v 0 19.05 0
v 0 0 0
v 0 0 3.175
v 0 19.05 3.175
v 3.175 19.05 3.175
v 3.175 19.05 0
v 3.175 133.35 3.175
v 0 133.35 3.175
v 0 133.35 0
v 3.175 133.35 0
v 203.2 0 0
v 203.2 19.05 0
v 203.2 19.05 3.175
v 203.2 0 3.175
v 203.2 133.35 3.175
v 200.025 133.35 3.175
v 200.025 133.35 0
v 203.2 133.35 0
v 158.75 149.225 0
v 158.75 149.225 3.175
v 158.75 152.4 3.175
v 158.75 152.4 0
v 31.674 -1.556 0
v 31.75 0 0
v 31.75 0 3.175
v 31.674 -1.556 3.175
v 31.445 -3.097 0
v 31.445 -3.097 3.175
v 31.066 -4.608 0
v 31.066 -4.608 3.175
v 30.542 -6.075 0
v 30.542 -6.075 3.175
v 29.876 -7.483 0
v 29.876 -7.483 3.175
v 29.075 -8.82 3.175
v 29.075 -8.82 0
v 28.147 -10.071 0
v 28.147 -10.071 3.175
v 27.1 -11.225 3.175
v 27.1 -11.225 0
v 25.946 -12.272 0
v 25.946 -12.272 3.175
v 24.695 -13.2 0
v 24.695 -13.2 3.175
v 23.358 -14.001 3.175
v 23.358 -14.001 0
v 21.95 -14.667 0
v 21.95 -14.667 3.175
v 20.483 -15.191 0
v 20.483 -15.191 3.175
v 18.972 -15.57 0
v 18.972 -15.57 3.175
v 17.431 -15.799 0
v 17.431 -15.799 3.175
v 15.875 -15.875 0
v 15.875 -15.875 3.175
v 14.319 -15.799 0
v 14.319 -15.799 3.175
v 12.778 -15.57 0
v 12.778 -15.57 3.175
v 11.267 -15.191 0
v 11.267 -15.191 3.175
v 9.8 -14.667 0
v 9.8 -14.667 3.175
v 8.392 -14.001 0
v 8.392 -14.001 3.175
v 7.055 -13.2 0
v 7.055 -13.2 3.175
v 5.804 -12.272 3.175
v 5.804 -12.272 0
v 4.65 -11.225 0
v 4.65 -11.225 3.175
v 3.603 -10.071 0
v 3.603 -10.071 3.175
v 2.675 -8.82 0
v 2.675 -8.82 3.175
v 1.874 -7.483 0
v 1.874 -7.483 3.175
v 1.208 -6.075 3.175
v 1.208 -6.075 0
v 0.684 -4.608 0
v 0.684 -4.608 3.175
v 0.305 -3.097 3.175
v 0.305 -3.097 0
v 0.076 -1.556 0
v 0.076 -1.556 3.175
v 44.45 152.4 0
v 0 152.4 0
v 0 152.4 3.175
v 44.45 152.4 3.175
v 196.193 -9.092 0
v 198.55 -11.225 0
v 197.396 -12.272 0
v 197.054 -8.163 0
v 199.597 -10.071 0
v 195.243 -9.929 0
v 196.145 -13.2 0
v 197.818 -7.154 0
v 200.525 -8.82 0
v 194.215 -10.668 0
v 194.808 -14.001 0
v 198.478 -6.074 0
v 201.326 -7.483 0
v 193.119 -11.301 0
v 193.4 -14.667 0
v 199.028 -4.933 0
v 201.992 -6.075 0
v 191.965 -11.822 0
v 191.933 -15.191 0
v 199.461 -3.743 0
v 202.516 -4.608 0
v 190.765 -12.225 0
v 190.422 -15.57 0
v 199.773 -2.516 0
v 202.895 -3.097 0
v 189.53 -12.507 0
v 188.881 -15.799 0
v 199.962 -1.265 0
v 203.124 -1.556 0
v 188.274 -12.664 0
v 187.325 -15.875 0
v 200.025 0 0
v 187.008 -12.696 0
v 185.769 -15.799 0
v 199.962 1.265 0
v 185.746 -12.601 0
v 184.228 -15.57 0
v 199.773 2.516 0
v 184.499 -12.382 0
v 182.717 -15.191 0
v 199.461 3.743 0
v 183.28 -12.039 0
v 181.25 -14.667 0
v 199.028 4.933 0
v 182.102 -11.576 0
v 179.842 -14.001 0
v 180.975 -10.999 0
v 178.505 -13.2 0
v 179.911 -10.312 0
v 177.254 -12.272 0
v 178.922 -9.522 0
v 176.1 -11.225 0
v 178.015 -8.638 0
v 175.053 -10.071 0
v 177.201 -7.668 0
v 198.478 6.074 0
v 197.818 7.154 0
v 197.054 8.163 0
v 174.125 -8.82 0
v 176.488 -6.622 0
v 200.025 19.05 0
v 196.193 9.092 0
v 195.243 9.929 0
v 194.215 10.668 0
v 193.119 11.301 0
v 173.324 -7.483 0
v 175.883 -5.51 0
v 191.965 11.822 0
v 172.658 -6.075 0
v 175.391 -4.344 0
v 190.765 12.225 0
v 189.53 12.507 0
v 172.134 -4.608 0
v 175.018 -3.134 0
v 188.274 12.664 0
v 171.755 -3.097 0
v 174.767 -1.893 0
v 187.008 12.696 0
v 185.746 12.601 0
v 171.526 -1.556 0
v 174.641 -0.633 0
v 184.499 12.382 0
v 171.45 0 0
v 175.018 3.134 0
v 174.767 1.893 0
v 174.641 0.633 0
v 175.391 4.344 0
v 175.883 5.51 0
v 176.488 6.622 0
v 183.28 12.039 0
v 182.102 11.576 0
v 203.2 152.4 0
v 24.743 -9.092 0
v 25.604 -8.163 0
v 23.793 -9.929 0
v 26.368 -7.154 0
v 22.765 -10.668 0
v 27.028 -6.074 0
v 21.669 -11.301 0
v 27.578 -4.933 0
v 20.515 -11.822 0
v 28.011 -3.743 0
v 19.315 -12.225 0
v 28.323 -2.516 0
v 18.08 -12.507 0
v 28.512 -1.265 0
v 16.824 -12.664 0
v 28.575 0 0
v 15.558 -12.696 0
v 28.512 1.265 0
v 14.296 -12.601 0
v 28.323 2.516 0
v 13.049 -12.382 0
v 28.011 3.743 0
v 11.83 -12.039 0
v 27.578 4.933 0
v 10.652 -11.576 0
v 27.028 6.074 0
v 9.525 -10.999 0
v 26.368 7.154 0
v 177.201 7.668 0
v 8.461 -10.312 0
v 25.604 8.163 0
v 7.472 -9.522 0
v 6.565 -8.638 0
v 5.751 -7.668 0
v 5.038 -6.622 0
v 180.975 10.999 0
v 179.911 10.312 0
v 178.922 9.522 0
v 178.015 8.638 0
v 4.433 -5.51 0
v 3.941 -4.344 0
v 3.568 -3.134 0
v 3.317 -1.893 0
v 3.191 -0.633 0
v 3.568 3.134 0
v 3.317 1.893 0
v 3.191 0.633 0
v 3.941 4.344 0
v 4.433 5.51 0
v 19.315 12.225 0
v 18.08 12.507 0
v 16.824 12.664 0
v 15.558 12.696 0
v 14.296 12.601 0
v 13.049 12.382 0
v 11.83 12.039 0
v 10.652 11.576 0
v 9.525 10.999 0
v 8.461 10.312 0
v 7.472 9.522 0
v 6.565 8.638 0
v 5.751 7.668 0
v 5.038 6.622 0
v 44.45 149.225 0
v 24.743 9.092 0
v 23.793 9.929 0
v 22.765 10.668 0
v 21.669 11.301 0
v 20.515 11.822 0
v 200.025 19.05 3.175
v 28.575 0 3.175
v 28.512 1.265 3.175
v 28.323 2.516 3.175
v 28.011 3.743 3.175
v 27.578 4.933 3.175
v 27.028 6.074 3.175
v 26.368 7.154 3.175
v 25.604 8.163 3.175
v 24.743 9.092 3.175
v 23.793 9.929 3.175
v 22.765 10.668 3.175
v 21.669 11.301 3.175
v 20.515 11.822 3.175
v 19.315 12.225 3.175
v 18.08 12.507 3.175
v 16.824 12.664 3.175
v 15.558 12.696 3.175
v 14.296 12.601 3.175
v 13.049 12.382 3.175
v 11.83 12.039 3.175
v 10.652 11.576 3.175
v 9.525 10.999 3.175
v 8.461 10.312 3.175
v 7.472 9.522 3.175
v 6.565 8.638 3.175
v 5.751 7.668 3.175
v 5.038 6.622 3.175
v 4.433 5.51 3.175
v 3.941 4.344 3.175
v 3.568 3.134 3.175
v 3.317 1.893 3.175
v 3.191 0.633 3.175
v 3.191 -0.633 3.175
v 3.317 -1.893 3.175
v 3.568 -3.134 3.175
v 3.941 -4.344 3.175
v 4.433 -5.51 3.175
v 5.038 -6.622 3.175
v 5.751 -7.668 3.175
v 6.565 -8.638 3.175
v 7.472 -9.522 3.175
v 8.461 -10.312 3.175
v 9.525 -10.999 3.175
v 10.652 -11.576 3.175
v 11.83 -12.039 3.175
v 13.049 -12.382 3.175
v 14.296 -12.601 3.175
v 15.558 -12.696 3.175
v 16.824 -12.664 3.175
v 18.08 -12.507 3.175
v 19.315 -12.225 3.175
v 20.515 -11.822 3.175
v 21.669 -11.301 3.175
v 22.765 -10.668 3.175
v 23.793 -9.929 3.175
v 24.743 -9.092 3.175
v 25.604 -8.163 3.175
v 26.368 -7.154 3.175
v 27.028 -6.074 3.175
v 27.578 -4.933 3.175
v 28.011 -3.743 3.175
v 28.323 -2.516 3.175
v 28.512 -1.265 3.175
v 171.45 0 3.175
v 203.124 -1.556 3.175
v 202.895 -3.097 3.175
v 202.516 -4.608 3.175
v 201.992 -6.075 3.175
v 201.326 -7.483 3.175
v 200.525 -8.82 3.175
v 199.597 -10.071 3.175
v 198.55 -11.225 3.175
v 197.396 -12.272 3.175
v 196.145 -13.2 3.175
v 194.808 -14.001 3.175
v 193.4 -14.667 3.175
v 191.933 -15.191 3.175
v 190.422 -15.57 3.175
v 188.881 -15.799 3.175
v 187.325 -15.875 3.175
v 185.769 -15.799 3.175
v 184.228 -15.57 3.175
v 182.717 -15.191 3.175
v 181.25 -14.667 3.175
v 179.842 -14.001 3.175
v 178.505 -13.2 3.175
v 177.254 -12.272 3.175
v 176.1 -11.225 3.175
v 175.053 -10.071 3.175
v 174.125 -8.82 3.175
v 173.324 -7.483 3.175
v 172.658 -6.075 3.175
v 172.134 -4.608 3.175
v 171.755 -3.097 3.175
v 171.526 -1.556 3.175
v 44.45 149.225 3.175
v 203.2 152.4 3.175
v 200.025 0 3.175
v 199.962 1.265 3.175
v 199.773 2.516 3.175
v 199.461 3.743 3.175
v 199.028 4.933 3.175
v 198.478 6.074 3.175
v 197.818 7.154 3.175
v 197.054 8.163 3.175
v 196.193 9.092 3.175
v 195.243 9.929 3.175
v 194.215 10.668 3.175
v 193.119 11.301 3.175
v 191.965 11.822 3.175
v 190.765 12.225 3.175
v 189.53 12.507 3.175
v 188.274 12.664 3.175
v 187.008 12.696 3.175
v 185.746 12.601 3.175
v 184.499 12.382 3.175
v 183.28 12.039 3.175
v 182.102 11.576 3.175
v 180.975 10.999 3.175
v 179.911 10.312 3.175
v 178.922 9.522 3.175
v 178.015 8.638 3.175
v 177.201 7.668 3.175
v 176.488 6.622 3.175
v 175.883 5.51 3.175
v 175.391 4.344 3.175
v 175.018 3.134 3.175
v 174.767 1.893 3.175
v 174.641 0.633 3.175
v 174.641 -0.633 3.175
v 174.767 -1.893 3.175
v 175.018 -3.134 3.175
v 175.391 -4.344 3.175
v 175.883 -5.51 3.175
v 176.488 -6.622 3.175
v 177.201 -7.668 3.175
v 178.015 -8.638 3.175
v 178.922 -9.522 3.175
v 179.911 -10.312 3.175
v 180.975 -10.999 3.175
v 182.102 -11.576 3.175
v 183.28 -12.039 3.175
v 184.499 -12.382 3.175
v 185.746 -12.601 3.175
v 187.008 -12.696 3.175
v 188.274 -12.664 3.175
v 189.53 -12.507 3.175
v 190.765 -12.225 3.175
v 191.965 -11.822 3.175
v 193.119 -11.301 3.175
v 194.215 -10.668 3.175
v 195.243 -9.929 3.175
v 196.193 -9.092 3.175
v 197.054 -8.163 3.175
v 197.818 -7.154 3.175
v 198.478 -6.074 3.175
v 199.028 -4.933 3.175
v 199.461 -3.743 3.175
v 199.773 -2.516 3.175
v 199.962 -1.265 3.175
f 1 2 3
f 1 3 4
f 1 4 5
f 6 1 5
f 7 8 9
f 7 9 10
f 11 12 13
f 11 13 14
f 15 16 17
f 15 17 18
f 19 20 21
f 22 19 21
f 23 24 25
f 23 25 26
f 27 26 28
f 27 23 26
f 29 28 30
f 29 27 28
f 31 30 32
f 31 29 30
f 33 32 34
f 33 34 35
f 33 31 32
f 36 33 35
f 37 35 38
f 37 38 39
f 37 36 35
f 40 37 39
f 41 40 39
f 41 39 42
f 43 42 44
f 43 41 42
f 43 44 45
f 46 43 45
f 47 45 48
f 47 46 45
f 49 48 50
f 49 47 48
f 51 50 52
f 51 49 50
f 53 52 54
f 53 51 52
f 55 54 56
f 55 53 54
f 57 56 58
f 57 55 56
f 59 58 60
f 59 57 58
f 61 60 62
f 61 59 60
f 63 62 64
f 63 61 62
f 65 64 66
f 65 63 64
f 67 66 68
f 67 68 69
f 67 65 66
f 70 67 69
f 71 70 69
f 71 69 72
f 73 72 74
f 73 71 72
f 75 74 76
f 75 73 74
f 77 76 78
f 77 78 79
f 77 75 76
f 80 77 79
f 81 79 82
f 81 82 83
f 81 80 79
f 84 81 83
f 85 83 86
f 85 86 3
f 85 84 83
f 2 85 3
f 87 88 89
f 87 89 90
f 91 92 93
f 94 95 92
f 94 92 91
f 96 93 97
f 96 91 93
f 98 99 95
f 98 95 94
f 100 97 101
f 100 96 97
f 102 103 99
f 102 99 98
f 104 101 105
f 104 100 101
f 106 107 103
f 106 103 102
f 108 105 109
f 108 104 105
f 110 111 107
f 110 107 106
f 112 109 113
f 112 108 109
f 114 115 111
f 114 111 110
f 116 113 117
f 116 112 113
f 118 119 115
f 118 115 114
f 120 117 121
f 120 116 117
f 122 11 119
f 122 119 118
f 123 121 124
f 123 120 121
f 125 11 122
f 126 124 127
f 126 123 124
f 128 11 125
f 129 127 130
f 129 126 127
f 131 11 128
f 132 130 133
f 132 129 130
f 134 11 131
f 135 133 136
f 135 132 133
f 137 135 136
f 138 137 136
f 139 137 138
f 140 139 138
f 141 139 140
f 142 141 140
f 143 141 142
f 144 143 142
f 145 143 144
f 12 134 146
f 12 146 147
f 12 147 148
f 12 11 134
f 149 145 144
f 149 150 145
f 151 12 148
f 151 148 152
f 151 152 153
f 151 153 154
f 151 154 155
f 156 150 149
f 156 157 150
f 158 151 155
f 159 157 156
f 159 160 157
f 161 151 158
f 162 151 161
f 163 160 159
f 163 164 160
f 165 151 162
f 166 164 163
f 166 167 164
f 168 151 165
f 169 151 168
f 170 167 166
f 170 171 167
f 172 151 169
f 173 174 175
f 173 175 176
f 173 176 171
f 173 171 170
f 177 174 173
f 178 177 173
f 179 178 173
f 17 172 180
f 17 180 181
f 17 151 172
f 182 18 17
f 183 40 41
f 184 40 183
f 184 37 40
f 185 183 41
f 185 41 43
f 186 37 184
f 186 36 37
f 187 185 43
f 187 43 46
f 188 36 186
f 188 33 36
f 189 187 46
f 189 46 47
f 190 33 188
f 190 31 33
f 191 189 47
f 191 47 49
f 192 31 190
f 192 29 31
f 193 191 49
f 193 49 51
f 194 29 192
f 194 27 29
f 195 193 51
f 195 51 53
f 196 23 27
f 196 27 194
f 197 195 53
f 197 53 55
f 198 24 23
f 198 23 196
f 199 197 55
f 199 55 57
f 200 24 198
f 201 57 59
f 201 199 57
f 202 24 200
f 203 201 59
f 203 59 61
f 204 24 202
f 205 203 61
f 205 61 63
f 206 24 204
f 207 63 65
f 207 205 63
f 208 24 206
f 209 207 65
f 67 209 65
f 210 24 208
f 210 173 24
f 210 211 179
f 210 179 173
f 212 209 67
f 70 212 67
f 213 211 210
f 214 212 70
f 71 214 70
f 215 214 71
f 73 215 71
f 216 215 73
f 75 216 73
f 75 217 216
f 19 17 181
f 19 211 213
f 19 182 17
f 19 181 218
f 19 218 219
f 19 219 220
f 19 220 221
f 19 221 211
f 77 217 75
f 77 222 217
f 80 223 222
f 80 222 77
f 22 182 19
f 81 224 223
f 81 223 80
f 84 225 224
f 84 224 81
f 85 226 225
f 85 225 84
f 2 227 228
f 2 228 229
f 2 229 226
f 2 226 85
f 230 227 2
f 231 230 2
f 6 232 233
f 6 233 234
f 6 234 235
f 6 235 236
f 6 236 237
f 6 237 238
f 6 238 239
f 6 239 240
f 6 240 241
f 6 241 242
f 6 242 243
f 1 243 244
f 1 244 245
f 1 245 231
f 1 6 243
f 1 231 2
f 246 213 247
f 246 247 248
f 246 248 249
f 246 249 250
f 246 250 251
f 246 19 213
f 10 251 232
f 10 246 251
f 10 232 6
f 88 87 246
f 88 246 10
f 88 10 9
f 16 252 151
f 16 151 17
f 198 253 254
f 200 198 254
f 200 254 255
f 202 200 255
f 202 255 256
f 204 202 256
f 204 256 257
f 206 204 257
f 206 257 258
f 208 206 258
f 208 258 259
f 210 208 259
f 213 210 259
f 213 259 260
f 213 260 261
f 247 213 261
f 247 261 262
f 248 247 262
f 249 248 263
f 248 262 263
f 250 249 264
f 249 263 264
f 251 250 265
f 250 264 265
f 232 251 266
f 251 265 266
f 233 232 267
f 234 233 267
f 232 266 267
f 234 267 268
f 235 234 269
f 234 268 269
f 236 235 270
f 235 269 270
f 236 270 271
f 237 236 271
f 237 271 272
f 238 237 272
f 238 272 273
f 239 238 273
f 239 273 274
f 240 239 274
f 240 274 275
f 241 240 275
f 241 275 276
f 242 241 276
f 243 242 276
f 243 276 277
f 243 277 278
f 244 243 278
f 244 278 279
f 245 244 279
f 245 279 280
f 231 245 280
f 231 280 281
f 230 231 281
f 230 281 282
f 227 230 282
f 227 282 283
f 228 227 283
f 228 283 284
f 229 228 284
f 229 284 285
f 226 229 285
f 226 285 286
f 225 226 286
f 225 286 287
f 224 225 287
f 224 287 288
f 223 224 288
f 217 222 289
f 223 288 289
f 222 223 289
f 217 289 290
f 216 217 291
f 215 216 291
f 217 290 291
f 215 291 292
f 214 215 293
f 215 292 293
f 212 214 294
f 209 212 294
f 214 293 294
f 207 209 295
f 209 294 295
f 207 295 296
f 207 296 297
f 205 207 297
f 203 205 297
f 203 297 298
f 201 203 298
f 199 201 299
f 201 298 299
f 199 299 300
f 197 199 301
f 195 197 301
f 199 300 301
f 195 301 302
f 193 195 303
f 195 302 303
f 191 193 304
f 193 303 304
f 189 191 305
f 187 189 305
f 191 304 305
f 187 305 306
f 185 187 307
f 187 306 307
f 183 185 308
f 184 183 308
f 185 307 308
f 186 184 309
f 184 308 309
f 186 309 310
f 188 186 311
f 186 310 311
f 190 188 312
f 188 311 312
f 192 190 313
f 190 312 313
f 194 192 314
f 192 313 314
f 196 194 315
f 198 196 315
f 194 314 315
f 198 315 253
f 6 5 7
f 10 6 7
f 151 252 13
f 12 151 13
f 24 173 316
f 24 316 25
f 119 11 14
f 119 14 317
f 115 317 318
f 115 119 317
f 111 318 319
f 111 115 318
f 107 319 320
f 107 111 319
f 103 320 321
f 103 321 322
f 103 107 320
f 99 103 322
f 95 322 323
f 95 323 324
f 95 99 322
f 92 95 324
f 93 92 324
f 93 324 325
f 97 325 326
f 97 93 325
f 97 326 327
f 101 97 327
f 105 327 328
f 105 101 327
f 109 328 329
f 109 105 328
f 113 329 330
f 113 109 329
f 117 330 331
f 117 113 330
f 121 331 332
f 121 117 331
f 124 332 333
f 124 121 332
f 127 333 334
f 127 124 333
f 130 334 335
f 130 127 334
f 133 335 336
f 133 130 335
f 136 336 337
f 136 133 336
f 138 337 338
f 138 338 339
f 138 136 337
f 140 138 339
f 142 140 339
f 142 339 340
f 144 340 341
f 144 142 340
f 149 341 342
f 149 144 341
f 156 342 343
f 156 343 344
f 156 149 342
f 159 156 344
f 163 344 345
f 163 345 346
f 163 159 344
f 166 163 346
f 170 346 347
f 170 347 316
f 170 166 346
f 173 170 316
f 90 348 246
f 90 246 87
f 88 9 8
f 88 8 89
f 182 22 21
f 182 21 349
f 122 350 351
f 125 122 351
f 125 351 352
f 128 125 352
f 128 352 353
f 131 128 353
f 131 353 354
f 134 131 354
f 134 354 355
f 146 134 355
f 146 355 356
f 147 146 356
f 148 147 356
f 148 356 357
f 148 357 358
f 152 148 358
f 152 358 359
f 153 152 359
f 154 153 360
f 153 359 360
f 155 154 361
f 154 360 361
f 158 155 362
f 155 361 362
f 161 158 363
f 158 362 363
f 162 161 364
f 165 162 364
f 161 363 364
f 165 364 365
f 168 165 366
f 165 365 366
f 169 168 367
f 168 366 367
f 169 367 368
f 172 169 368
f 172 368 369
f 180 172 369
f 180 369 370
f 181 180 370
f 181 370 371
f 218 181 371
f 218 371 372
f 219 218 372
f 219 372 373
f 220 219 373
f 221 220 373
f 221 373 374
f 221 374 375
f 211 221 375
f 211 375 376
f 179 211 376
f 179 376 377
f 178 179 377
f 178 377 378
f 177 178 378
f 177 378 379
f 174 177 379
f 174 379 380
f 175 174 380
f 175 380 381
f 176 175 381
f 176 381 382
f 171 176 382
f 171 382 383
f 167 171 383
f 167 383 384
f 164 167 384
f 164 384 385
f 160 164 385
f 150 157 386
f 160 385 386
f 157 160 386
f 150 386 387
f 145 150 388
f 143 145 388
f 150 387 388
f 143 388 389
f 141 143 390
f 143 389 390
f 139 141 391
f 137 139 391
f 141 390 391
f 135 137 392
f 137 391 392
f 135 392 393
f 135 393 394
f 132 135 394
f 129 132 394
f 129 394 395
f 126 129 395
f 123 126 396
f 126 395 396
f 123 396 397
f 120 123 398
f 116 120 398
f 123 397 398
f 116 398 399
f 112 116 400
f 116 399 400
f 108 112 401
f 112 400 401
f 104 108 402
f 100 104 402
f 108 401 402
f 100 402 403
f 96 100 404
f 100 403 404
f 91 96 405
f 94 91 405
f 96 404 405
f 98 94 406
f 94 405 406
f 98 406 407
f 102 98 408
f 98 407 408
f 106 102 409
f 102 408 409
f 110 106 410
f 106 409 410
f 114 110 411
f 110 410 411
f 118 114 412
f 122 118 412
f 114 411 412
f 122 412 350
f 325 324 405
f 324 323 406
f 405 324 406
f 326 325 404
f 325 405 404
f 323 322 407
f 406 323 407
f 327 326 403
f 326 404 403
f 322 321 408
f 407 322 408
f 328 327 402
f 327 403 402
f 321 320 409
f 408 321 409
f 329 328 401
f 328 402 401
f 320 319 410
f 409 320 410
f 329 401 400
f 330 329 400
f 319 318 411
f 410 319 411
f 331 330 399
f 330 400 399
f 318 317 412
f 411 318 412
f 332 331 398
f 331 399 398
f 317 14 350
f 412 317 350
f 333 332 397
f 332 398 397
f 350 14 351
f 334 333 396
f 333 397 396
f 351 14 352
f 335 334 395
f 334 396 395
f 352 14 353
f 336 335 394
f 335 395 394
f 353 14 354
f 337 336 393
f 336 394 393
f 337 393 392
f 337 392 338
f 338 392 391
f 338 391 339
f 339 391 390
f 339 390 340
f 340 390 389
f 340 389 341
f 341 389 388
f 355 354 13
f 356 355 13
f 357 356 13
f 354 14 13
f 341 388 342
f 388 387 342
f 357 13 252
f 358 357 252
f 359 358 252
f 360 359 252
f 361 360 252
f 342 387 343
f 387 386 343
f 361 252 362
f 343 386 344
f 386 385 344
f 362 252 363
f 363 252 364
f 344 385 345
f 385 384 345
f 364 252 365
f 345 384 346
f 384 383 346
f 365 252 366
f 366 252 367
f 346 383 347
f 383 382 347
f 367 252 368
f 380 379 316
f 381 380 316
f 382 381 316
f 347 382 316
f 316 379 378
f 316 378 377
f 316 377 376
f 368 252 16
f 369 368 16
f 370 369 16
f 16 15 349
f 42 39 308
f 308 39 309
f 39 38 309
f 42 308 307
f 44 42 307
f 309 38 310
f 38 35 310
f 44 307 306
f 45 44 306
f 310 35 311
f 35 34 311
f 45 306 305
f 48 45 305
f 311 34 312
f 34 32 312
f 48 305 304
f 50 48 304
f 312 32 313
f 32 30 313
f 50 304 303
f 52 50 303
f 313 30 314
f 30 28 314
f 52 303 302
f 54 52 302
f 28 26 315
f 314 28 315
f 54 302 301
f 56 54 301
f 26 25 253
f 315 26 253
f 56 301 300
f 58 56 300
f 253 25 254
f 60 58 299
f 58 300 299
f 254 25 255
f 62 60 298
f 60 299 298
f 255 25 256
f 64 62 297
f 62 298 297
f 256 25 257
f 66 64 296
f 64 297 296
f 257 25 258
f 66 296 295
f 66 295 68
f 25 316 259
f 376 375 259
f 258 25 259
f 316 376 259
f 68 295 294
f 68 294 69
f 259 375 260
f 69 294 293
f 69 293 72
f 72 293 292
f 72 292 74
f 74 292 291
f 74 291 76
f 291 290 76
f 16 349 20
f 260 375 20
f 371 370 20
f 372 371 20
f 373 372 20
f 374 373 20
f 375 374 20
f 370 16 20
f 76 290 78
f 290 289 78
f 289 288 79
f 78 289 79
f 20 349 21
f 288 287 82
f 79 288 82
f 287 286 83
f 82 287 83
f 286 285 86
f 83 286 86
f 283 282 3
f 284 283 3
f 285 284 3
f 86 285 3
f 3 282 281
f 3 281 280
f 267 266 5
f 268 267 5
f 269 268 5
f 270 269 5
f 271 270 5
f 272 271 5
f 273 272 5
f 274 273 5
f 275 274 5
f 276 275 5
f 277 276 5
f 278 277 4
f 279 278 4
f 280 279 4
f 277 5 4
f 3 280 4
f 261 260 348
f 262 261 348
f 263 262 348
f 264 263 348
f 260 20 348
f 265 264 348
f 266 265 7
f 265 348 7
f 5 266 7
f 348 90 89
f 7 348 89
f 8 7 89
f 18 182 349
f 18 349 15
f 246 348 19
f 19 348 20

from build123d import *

# Parameters (mm, degrees)
BOSS_EXTRUDE1_DEPTH     = 3.175
SKETCH2_R               = 12.7
CUT_EXTRUDE1_DEPTH      = 1
CUT_EXTRUDE1_DEPTH_BACK = 4.175
SKETCH3_W               = 3.175
SKETCH3_H               = 114.3
SKETCH3_W_2             = 114.3
SKETCH3_H_2             = 3.175
CUT_EXTRUDE2_DEPTH      = 4.175


with BuildPart() as part:
    # Sketch1 → Boss-Extrude1 (new body)
    with BuildSketch(Plane.XY):
        with BuildLine():
            Line((0, 0), (0, 152.4))
            Line((0, 152.4), (203.2, 152.4))
            Line((203.2, 152.4), (203.2, 0))
            ThreePointArc((203.2, 0), (187.325, -15.875), (171.45, 0))
            Line((171.45, 0), (31.75, 0))
            ThreePointArc((31.75, 0), (15.875, -15.875), (0, 0))
        make_face()
    extrude(amount=BOSS_EXTRUDE1_DEPTH)

    # Sketch2 → Cut-Extrude1 (cut, two sides)
    with BuildSketch(Plane.XY.offset(3.175)) as cut_extrude1_sk:
        with Locations((15.875, 0)):
            Circle(SKETCH2_R)
        with Locations((187.325, 0)):
            Circle(SKETCH2_R)
    extrude(amount=CUT_EXTRUDE1_DEPTH, mode=Mode.SUBTRACT)
    extrude(cut_extrude1_sk.sketch, amount=-CUT_EXTRUDE1_DEPTH_BACK, mode=Mode.SUBTRACT)

    # Sketch3 → Cut-Extrude2 (cut, through all)
    with BuildSketch(Plane.XY.offset(3.175)):
        with Locations((201.6125, 76.2)):
            Rectangle(SKETCH3_W, SKETCH3_H)
        with Locations((1.5875, 76.2)):
            Rectangle(SKETCH3_W, SKETCH3_H)
        with Locations((101.6, 150.8125)):
            Rectangle(SKETCH3_W_2, SKETCH3_H_2)
    extrude(amount=-CUT_EXTRUDE2_DEPTH, mode=Mode.SUBTRACT)


solid = part.part
